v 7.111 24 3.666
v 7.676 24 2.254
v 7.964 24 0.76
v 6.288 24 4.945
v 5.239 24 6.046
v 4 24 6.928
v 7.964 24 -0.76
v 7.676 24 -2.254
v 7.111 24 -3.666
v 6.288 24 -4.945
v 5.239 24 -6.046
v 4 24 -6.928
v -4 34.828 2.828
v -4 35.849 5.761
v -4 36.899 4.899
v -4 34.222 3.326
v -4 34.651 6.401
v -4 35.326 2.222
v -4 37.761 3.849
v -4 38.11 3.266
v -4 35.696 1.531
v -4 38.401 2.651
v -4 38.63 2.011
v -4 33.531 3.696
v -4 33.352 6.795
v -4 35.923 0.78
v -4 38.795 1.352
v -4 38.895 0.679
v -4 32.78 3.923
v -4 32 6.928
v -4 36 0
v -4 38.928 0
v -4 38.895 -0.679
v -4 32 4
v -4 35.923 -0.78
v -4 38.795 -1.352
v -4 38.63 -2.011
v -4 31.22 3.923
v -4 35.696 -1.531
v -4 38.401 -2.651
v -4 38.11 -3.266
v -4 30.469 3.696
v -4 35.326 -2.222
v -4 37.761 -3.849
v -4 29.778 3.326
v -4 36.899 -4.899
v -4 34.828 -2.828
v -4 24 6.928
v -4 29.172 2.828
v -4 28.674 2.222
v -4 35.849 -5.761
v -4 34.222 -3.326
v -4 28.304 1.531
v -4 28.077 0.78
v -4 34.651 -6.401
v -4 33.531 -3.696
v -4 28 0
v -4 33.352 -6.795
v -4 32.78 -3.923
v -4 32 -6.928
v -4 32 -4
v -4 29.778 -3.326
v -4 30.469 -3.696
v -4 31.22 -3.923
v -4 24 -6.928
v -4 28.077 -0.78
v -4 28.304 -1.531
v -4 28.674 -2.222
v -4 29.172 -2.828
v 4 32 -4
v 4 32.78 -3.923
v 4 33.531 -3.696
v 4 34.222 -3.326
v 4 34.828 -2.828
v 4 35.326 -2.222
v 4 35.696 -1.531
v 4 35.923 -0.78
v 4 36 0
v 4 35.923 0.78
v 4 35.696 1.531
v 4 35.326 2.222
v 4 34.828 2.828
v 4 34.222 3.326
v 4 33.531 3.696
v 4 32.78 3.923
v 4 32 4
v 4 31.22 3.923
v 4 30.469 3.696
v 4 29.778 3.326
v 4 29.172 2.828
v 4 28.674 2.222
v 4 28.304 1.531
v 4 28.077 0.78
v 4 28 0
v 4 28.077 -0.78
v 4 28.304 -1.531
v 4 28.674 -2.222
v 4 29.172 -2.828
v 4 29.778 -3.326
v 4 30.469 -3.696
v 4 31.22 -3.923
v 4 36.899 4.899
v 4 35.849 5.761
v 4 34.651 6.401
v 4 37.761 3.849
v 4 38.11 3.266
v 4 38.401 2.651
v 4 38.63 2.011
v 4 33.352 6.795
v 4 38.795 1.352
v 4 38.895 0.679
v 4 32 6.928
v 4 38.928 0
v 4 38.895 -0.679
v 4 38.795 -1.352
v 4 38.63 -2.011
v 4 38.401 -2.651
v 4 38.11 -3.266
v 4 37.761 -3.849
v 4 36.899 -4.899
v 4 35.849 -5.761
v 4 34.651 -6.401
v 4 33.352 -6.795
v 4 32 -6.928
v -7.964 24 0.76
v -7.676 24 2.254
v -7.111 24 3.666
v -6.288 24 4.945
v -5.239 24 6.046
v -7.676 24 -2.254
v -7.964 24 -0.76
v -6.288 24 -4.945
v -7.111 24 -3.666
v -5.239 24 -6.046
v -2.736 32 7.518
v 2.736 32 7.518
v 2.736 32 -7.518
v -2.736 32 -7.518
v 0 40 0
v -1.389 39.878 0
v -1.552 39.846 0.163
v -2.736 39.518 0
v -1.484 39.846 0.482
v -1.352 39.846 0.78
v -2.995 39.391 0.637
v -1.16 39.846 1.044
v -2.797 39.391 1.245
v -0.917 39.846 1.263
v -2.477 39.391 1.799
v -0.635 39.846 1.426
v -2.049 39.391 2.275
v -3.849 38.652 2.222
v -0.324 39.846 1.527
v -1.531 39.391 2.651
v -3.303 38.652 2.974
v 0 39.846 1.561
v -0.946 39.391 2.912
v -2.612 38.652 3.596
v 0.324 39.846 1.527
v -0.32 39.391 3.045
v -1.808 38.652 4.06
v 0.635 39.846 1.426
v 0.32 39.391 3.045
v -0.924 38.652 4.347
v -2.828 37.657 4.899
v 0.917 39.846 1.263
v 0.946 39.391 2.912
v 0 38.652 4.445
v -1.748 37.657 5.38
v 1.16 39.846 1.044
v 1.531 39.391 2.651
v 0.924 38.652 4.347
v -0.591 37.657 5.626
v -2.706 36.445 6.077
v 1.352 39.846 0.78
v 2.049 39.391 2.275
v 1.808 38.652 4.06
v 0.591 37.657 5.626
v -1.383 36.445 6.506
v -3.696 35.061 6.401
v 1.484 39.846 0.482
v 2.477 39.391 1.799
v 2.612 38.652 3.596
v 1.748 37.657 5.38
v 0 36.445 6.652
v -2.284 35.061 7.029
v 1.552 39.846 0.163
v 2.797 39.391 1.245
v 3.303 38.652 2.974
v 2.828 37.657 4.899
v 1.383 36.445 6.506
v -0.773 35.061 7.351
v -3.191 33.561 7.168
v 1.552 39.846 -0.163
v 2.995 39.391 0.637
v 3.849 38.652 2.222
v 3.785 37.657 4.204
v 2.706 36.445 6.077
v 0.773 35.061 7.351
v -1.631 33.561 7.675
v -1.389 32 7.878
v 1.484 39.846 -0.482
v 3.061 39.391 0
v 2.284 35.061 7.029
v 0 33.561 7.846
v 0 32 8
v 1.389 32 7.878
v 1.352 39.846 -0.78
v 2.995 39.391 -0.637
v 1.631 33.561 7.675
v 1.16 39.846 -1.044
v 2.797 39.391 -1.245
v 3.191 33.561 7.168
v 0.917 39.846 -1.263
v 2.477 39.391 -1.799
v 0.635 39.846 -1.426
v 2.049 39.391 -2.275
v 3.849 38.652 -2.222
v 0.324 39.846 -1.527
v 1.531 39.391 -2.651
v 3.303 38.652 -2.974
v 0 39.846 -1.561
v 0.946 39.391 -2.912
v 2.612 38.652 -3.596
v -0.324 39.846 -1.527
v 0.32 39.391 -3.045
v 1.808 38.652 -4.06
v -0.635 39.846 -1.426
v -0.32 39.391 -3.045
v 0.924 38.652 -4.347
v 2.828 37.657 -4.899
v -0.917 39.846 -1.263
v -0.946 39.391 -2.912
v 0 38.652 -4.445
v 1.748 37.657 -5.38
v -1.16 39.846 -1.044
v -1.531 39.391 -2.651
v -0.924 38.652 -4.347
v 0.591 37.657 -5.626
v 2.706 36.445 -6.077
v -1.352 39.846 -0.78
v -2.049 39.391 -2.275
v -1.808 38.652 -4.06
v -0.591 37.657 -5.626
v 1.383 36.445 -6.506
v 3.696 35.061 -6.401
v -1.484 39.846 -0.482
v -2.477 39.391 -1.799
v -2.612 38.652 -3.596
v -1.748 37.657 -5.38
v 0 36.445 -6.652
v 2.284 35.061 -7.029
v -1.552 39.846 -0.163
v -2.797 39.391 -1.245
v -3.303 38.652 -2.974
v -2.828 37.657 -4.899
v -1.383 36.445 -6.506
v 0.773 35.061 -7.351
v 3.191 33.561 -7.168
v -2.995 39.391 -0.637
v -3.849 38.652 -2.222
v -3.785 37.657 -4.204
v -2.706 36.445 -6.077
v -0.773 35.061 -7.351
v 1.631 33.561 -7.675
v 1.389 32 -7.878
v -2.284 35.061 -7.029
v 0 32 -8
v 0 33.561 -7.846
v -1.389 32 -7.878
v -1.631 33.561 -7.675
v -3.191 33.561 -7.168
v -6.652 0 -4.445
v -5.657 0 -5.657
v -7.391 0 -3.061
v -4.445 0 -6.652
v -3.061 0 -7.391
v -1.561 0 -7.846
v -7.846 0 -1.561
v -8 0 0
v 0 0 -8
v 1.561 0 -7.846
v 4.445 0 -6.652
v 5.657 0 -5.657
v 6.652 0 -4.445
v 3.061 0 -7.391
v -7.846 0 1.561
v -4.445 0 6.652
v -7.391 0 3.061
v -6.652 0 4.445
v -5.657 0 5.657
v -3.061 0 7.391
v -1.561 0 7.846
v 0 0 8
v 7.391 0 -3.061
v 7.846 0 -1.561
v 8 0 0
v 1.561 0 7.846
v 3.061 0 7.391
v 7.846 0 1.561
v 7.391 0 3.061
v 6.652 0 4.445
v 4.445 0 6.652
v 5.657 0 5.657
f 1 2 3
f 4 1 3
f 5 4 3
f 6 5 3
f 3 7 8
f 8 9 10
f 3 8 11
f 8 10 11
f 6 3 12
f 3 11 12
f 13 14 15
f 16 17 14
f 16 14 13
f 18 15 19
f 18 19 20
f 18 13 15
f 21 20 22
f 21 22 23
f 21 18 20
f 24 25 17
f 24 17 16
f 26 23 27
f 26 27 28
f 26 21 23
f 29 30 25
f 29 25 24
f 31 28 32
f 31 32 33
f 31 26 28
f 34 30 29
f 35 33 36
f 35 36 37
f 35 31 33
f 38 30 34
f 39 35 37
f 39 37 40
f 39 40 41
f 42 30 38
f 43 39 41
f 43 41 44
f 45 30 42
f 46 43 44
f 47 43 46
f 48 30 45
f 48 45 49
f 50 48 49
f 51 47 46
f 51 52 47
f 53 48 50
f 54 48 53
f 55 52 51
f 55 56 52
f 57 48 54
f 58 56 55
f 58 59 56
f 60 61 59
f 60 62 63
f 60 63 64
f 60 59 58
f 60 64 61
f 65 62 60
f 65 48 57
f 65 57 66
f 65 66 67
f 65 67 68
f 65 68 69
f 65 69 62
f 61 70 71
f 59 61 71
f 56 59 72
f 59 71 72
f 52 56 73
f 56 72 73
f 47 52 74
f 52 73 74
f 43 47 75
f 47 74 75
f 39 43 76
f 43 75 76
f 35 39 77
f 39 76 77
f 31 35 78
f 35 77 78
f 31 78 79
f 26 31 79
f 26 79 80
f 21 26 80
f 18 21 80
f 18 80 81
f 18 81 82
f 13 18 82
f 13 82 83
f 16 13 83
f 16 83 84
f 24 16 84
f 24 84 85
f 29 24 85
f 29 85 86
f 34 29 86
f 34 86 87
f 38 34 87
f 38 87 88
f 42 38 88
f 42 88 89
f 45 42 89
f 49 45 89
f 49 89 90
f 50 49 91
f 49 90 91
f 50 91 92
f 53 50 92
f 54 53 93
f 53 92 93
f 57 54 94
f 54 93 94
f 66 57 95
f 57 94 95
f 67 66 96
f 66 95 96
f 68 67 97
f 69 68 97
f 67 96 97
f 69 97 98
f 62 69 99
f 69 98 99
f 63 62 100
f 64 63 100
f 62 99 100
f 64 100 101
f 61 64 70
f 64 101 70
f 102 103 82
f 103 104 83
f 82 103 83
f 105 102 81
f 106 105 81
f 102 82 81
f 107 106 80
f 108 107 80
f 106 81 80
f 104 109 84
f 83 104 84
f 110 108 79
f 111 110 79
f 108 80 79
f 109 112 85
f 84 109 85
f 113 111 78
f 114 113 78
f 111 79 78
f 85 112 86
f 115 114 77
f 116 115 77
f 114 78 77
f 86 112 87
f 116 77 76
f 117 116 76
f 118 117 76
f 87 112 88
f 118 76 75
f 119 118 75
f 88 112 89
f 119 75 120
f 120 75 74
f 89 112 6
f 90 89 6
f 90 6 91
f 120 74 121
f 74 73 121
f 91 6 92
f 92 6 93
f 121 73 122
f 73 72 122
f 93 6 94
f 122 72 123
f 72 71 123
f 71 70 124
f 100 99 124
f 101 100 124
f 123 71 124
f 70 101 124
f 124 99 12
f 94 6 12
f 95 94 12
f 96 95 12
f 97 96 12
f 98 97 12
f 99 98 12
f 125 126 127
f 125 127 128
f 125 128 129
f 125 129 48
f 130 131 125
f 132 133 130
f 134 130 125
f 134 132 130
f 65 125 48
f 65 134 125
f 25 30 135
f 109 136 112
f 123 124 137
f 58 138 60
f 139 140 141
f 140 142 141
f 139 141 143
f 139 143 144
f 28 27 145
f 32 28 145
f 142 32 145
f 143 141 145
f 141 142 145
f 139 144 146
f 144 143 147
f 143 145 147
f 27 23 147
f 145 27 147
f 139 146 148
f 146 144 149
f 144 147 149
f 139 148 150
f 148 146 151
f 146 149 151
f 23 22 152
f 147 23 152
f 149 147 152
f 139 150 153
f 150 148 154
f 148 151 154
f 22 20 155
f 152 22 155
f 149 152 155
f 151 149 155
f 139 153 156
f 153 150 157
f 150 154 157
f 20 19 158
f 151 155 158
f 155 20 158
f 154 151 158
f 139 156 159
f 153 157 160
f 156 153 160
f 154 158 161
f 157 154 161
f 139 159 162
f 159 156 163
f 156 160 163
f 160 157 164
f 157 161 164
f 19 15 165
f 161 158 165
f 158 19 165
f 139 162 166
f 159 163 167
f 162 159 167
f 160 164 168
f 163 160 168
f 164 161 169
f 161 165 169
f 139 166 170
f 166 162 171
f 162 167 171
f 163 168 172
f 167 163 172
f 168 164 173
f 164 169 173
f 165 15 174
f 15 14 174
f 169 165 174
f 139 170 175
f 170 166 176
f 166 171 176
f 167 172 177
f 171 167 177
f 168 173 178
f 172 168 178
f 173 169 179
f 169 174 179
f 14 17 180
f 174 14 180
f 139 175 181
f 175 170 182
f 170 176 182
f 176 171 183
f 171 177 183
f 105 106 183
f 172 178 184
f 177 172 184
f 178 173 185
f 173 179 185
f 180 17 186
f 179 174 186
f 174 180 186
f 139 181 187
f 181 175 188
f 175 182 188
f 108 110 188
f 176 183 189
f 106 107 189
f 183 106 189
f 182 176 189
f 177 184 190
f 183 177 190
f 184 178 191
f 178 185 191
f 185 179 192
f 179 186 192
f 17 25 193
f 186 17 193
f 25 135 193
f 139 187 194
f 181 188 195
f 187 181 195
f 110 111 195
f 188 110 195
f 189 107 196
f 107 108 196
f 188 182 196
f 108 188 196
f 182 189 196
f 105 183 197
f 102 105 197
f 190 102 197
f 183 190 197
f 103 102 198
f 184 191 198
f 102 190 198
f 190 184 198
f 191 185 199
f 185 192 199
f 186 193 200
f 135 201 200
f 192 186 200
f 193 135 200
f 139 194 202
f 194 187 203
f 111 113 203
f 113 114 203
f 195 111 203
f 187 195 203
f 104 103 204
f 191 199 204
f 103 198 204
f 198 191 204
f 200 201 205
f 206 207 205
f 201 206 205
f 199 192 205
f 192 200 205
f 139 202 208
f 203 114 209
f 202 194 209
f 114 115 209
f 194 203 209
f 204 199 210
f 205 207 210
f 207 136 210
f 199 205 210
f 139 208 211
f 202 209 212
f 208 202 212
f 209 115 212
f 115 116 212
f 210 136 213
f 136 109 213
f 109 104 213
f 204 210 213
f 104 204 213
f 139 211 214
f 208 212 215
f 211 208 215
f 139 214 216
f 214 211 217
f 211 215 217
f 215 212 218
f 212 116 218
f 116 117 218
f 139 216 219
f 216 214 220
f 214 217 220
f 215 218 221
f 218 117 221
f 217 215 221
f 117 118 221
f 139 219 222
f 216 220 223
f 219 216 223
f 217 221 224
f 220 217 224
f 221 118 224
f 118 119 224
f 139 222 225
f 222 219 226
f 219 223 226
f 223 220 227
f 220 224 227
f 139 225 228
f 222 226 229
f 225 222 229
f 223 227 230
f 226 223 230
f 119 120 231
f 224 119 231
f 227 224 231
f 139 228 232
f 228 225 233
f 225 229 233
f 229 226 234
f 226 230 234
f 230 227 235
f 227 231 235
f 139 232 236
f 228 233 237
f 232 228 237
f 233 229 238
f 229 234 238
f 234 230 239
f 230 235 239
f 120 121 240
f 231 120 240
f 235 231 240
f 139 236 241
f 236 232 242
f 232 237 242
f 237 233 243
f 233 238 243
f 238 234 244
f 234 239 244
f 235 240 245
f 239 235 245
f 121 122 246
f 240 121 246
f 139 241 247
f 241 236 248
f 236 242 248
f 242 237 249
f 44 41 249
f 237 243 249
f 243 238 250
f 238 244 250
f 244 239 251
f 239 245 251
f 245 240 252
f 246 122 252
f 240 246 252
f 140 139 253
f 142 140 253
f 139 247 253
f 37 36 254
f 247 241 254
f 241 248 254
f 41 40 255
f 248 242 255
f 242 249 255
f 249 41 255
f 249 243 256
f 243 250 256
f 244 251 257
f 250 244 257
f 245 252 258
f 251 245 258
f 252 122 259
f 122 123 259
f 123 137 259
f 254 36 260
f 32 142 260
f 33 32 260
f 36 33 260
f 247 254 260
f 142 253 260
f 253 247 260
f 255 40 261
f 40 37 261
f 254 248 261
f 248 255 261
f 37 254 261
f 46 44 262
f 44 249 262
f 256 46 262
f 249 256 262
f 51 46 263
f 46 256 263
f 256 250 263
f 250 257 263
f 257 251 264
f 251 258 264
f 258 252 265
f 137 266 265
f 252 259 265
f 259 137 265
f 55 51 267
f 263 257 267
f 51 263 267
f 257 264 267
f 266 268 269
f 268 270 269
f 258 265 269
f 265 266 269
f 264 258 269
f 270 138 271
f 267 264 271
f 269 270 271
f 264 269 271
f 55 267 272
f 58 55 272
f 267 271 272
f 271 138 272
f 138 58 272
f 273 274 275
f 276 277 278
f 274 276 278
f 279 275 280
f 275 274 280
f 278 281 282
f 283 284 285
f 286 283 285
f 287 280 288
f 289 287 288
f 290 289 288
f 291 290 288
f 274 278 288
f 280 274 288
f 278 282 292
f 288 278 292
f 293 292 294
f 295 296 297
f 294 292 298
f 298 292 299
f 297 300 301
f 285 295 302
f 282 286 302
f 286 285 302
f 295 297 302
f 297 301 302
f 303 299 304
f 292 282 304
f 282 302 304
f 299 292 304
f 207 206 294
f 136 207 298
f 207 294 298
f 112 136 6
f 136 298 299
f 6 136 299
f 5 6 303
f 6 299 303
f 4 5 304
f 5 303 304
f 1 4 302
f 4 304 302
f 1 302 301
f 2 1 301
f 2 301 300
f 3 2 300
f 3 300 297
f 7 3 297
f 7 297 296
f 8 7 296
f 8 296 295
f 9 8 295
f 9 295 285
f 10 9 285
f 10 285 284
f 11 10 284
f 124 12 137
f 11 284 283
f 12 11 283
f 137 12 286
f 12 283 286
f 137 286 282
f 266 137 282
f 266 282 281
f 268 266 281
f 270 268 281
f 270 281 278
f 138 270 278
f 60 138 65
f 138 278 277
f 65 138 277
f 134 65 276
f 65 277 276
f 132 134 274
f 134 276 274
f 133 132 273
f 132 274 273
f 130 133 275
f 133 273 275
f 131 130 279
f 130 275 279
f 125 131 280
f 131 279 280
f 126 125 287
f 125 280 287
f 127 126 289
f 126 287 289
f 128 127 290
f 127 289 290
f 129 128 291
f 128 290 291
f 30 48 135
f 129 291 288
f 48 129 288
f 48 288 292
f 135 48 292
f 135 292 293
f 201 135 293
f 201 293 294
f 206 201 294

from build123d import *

# Parameters (mm, degrees)
SKETCH_1_R          = 8
EXTRUDE_1_DEPTH     = 32
CUT_EXTRUDE_START   = -16
CUT_EXTRUDE_1_DEPTH = 16
SKETCH_6_R          = 4
CUT_EXTRUDE_2_DEPTH = 43.520583251


with BuildPart() as part:
    # 草图1 → 凸台-拉伸1 (new body)
    with BuildSketch(Plane(origin=(0, 0, 0), x_dir=(1, 0, 0), z_dir=(0, 1, 0))):
        with Locations(Location((0, 0, 0), (0, 0, 270))):
            Circle(SKETCH_1_R)
    extrude(amount=EXTRUDE_1_DEPTH)

    # 草图3 one side → 旋转4 (revolve)
    with BuildSketch(Plane.XY):
        with BuildLine():
            Line((0, 24), (0, 40))
            ThreePointArc((0, 40), (-8, 32), (0, 24))
        make_face()
    revolve(axis=Axis((0, 32, 0), (0, 1, 0)))

    # 草图5 → 切除-拉伸1 (cut)
    with BuildSketch(Plane(origin=(0, 40, 0), x_dir=(1, 0, 0), z_dir=(0, 1, 0)).offset(CUT_EXTRUDE_START)):
        with BuildLine():
            Line((4, -6.92820323), (4, 6.92820323))
            ThreePointArc((4, 6.92820323), (8, 0), (4, -6.92820323))
        make_face()
        with BuildLine():
            Line((-4, -6.92820323), (-4, 6.92820323))
            ThreePointArc((-4, 6.92820323), (-8, 0), (-4, -6.92820323))
        make_face()
    extrude(amount=CUT_EXTRUDE_1_DEPTH, mode=Mode.SUBTRACT)

    # 草图6 → 切除-拉伸2 (cut, through all)
    with BuildSketch(Plane(origin=(4, 0, 0), x_dir=(0, 0, -1), z_dir=(1, 0, 0))):
        with Locations((0, 32)):
            Circle(SKETCH_6_R)
    extrude(amount=-CUT_EXTRUDE_2_DEPTH, mode=Mode.SUBTRACT)


solid = part.part
